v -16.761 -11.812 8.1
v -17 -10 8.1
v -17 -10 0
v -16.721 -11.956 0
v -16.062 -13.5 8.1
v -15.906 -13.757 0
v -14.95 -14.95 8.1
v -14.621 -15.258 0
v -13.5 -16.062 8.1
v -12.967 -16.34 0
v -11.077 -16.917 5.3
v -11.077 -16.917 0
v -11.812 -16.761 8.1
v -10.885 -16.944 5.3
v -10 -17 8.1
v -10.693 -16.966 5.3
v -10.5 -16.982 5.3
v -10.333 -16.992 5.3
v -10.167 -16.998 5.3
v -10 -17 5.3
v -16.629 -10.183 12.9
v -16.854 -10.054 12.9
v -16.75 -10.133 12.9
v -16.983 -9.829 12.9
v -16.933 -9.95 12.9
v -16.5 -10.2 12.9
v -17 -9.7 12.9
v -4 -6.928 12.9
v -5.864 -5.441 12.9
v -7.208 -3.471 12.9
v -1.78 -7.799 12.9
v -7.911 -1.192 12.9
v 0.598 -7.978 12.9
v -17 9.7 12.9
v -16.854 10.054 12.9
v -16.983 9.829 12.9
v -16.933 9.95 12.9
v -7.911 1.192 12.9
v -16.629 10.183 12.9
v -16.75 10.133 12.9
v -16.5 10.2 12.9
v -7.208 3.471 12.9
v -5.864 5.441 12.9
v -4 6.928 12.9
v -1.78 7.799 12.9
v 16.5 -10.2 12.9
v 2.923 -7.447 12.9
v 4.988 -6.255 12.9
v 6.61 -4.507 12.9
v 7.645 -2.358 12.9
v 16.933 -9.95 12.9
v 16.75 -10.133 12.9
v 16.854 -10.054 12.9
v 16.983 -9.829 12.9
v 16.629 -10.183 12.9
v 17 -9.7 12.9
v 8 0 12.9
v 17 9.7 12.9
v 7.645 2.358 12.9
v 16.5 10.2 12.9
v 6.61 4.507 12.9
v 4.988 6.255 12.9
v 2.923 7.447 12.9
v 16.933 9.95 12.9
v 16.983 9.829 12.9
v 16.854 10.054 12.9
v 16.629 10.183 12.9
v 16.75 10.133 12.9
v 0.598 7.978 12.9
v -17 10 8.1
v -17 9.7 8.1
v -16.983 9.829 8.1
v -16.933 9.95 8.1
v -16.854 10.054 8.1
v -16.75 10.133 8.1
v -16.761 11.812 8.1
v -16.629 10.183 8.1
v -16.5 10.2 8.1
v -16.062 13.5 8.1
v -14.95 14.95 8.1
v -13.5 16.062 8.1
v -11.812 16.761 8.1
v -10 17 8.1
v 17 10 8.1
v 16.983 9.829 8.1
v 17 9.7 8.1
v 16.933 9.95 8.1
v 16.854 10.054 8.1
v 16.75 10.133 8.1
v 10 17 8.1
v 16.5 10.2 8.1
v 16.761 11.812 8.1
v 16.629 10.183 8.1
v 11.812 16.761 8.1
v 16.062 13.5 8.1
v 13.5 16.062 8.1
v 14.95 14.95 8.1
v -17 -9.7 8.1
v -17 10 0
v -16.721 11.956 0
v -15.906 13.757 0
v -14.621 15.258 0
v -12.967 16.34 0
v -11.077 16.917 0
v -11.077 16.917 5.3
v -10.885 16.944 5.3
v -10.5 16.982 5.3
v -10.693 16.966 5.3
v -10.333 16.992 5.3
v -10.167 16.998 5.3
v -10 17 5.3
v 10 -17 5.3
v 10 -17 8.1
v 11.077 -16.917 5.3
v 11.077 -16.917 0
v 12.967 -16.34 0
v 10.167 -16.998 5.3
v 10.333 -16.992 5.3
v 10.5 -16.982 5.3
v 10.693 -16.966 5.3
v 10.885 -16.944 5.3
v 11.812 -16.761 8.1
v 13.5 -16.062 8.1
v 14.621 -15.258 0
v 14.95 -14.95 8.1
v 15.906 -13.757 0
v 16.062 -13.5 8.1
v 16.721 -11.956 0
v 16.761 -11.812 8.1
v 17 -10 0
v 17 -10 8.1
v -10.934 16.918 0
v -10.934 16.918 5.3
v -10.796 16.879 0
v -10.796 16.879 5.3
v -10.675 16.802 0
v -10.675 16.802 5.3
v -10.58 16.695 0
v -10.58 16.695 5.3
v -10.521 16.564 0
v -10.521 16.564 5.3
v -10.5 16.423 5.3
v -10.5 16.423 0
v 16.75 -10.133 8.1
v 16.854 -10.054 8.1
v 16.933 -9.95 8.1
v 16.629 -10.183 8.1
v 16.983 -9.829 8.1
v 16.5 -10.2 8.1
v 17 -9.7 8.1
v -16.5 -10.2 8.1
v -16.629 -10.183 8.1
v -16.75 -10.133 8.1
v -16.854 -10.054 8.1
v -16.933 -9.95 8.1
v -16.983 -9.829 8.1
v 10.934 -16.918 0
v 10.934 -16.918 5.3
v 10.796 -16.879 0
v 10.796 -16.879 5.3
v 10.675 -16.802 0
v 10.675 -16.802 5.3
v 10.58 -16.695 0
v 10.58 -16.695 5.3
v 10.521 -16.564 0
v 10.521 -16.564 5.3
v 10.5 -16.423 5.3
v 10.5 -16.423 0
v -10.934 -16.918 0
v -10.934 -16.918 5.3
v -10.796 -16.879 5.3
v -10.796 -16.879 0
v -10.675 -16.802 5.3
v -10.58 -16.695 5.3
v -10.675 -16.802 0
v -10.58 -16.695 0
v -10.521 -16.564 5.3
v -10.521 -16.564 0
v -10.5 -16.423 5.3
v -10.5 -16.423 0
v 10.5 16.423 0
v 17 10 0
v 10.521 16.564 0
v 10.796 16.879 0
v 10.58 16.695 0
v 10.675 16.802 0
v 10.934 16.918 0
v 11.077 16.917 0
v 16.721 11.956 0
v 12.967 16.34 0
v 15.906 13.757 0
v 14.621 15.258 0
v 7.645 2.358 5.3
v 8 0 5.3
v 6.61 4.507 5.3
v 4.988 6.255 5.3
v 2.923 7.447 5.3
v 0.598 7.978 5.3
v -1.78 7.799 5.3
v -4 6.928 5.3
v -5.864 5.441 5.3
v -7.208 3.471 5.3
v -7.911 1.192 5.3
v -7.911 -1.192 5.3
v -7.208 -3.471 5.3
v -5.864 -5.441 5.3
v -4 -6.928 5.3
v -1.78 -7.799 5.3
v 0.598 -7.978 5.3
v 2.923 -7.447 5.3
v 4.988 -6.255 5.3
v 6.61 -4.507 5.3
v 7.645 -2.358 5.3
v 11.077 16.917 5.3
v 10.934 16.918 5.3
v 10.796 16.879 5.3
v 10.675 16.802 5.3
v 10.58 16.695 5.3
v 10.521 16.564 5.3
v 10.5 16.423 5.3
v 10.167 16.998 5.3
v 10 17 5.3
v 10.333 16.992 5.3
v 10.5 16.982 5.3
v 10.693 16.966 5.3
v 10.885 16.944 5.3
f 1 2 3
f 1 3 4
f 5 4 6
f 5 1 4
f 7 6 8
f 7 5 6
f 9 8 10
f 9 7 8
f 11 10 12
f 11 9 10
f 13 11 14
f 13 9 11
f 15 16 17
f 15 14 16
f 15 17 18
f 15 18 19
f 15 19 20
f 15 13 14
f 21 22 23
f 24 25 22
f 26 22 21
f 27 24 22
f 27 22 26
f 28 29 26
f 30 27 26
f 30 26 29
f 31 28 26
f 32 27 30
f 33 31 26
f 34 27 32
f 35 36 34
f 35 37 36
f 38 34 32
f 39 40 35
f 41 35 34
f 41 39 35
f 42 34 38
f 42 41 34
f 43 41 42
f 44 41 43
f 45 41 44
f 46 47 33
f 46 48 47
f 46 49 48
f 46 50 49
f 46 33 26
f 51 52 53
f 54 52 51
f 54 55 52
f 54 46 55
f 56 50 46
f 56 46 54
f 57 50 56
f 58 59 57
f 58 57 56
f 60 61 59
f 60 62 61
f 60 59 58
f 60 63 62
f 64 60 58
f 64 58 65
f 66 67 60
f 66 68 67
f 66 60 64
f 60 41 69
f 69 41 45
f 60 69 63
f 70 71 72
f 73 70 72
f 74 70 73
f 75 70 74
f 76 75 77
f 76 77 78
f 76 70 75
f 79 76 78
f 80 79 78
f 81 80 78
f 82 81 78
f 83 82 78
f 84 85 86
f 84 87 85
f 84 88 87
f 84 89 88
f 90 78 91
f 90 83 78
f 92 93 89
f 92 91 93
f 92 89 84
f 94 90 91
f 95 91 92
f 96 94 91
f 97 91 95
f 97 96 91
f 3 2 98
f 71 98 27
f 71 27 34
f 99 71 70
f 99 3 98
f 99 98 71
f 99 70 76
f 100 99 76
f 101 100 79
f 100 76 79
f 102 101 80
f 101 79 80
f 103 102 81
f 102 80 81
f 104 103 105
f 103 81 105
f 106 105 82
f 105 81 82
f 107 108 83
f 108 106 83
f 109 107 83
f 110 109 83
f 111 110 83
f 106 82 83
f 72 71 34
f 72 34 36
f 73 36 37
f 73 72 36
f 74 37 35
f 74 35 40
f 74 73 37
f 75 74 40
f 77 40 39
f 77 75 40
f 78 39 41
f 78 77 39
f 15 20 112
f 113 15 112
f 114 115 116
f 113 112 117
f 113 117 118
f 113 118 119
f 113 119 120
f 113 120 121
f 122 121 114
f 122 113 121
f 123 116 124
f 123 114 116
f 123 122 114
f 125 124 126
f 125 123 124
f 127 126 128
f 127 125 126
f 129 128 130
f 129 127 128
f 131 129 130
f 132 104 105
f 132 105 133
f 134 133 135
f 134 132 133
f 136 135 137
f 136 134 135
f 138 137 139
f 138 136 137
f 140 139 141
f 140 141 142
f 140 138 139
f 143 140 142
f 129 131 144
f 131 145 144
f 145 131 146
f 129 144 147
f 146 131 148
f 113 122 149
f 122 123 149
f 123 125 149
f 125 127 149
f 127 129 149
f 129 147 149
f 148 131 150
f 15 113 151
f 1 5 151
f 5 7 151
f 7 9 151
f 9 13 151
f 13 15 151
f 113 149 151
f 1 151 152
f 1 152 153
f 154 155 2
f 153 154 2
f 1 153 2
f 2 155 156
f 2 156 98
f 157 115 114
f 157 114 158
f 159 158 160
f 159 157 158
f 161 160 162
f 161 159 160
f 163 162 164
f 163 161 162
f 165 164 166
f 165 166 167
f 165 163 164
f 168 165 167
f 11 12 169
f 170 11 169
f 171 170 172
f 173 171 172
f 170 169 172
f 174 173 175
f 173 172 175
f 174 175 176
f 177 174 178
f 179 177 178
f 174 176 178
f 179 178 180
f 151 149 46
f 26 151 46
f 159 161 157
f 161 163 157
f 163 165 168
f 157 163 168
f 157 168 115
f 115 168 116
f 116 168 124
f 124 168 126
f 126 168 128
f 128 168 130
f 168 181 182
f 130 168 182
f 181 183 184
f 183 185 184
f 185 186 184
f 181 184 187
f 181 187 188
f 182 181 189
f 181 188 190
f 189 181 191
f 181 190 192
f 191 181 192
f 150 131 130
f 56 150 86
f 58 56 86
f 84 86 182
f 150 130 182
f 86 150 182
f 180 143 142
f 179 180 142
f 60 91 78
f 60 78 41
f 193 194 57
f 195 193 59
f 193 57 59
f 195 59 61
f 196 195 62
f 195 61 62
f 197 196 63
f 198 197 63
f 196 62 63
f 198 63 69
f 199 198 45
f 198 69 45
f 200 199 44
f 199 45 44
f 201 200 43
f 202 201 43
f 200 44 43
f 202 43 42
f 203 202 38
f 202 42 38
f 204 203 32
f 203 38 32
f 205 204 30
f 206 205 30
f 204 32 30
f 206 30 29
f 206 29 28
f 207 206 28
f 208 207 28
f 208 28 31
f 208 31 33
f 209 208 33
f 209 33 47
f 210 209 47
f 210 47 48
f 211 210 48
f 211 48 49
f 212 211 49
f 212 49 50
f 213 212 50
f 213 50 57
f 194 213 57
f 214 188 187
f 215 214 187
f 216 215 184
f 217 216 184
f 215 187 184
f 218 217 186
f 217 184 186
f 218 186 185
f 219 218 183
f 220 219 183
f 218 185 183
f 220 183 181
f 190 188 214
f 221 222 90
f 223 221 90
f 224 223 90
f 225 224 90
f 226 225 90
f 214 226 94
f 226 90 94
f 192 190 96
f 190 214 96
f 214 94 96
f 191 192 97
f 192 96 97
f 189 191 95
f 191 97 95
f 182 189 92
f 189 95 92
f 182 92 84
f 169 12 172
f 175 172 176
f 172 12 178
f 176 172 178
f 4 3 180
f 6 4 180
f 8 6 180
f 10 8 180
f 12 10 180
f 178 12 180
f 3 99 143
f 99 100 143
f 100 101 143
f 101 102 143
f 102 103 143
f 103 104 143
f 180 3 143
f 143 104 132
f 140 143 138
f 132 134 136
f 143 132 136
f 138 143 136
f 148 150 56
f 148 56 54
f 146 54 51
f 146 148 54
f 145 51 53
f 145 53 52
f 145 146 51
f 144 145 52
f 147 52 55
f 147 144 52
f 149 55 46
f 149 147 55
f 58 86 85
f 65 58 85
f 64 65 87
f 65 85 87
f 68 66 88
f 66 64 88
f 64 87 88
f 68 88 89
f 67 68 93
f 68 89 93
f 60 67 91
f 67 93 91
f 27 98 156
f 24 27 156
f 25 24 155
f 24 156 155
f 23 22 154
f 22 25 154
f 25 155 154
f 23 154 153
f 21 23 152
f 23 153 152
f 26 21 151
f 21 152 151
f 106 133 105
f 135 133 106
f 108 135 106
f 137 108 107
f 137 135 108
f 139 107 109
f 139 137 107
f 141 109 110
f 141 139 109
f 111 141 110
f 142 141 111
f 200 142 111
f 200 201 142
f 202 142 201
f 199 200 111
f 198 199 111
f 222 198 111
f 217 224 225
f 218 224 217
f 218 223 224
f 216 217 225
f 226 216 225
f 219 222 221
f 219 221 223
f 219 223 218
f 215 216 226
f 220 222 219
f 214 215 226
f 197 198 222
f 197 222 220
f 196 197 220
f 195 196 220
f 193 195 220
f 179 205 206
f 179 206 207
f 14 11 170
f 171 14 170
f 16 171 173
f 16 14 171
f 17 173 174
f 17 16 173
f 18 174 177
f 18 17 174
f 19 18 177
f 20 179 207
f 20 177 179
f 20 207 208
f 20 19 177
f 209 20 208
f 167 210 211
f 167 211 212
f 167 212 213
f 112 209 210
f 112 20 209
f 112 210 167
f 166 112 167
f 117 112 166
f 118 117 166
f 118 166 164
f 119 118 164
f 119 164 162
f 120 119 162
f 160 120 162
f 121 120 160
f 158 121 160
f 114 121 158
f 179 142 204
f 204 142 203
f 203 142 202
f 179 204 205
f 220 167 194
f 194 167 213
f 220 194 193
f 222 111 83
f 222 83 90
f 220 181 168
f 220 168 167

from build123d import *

# Parameters (mm, degrees)
F0_W        = 34
F0_H        = 34
F1_DEPTH    = 12.9
F2_W        = 21
F2_H        = 5.3
F3_DEPTH    = 34.001
F4_W        = 6.8
F4_H        = 4.8
F5_DEPTH    = 34.001
F6_R        = 8
F7_DEPTH    = 12.901
F8_R        = 7
F9_T1_DEPTH = 6.0500204163
F9_T3_DEPTH = 6.751561158


# Not quite as in the source:
# - a fillet or chamfer that OpenCascade refuses, or shapes differently, is made with other operations: its cross-section is extruded or revolved along the edge and cut away or added


with BuildPart() as f1:
    # F0 (on Top) → F1 (new body)
    with BuildSketch(Plane.XY):
        Rectangle(F0_W, F0_H)
    extrude(amount=F1_DEPTH)

    # F2 (on face) → F3 (cut, through all)
    with BuildSketch(Plane.XZ.offset(17)):
        with Locations((0, 2.65)):
            Rectangle(F2_W, F2_H)
    extrude(amount=-F3_DEPTH, mode=Mode.SUBTRACT)

    # F4 (on face) → F5 (cut, through all)
    with BuildSketch(Plane.YZ.offset(17)):
        with Locations((-13.6, 10.5)):
            Rectangle(F4_W, F4_H)
        with Locations((13.6, 10.5)):
            Rectangle(F4_W, F4_H)
    extrude(amount=-F5_DEPTH, mode=Mode.SUBTRACT)

    # F6 (on face) → F7 (cut, through all)
    with BuildSketch(Plane.XY.offset(12.9)):
        Circle(F6_R)
    extrude(amount=-F7_DEPTH, mode=Mode.SUBTRACT)

    # F8
    f8_edges = [f1.edges().sort_by_distance(p)[0] for p in [
        (17, -17, 4.05),
        (17, 17, 4.05),
        (-17, -17, 4.05),
        (-17, 17, 4.05),
    ]]
    fillet(f8_edges, radius=F8_R)

    # F9: fillet of radius 0.5 on 8 edges, made by hand

    # F9_s2 → F9_t1 (cut)
    with BuildSketch(Plane.XY.offset(8.1)):
        with BuildLine():
            ThreePointArc((17, -9.7), (16.8535533906, -10.0535533906), (16.5, -10.2))
            Line((16.5, -10.2), (16.5, -10.25))
            Line((16.5, -10.25), (16.9971422738, -10.25))
            Line((16.9971422738, -10.25), (17.0471218615, -10.2014285714))
            ThreePointArc((17.0471218615, -10.2014285714), (17.05, -10), (17.05, -9.7))
            Line((17.05, -9.7), (17, -9.7))
        make_face()
        with BuildLine():
            ThreePointArc((17, 9.7), (16.8535533906, 10.0535533906), (16.5, 10.2))
            Line((16.5, 10.2), (16.5, 10.25))
            Line((16.5, 10.25), (16.9971422738, 10.25))
            Line((16.9971422738, 10.25), (17.0471218615, 10.2014285714))
            ThreePointArc((17.0471218615, 10.2014285714), (17.05, 10), (17.05, 9.7))
            Line((17.05, 9.7), (17, 9.7))
        make_face()
        with BuildLine():
            ThreePointArc((-17, 9.7), (-16.8535533906, 10.0535533906), (-16.5, 10.2))
            Line((-16.5, 10.2), (-16.5, 10.25))
            Line((-16.5, 10.25), (-16.9971422738, 10.25))
            Line((-16.9971422738, 10.25), (-17.0471218615, 10.2014285714))
            ThreePointArc((-17.0471218615, 10.2014285714), (-17.05, 10), (-17.05, 9.7))
            Line((-17.05, 9.7), (-17, 9.7))
        make_face()
        with BuildLine():
            ThreePointArc((-17, -9.7), (-16.8535533906, -10.0535533906), (-16.5, -10.2))
            Line((-16.5, -10.2), (-16.5, -10.25))
            Line((-16.5, -10.25), (-16.9971422738, -10.25))
            Line((-16.9971422738, -10.25), (-17.0471218615, -10.2014285714))
            ThreePointArc((-17.0471218615, -10.2014285714), (-17.05, -10), (-17.05, -9.7))
            Line((-17.05, -9.7), (-17, -9.7))
        make_face()
    extrude(amount=F9_T1_DEPTH, mode=Mode.SUBTRACT)

    # F9_s4 → F9_t3 (cut)
    with BuildSketch(Plane.XY.offset(-1.451561158)):
        with BuildLine():
            ThreePointArc((11.0769230769, -16.9166636962), (10.6747781822, -16.802393552), (10.5, -16.4226162893))
            Line((10.5, -16.4226162893), (10.5, -16.9821200219))
            ThreePointArc((10.5, -16.9821200219), (10.789140501, -16.9553761415), (11.0769230769, -16.9166636962))
        make_face()
        with BuildLine():
            ThreePointArc((-11.0769230769, -16.9166636962), (-10.6747781822, -16.802393552), (-10.5, -16.4226162893))
            Line((-10.5, -16.4226162893), (-10.5, -16.9821200219))
            ThreePointArc((-10.5, -16.9821200219), (-10.789140501, -16.9553761415), (-11.0769230769, -16.9166636962))
        make_face()
        with BuildLine():
            ThreePointArc((-11.0769230769, 16.9166636962), (-10.6747781822, 16.802393552), (-10.5, 16.4226162893))
            Line((-10.5, 16.4226162893), (-10.5, 16.9821200219))
            ThreePointArc((-10.5, 16.9821200219), (-10.789140501, 16.9553761415), (-11.0769230769, 16.9166636962))
        make_face()
        with BuildLine():
            ThreePointArc((11.0769230769, 16.9166636962), (10.6747781822, 16.802393552), (10.5, 16.4226162893))
            Line((10.5, 16.4226162893), (10.5, 16.9821200219))
            ThreePointArc((10.5, 16.9821200219), (10.789140501, 16.9553761415), (11.0769230769, 16.9166636962))
        make_face()
    extrude(amount=F9_T3_DEPTH, mode=Mode.SUBTRACT)


solid = f1.part
